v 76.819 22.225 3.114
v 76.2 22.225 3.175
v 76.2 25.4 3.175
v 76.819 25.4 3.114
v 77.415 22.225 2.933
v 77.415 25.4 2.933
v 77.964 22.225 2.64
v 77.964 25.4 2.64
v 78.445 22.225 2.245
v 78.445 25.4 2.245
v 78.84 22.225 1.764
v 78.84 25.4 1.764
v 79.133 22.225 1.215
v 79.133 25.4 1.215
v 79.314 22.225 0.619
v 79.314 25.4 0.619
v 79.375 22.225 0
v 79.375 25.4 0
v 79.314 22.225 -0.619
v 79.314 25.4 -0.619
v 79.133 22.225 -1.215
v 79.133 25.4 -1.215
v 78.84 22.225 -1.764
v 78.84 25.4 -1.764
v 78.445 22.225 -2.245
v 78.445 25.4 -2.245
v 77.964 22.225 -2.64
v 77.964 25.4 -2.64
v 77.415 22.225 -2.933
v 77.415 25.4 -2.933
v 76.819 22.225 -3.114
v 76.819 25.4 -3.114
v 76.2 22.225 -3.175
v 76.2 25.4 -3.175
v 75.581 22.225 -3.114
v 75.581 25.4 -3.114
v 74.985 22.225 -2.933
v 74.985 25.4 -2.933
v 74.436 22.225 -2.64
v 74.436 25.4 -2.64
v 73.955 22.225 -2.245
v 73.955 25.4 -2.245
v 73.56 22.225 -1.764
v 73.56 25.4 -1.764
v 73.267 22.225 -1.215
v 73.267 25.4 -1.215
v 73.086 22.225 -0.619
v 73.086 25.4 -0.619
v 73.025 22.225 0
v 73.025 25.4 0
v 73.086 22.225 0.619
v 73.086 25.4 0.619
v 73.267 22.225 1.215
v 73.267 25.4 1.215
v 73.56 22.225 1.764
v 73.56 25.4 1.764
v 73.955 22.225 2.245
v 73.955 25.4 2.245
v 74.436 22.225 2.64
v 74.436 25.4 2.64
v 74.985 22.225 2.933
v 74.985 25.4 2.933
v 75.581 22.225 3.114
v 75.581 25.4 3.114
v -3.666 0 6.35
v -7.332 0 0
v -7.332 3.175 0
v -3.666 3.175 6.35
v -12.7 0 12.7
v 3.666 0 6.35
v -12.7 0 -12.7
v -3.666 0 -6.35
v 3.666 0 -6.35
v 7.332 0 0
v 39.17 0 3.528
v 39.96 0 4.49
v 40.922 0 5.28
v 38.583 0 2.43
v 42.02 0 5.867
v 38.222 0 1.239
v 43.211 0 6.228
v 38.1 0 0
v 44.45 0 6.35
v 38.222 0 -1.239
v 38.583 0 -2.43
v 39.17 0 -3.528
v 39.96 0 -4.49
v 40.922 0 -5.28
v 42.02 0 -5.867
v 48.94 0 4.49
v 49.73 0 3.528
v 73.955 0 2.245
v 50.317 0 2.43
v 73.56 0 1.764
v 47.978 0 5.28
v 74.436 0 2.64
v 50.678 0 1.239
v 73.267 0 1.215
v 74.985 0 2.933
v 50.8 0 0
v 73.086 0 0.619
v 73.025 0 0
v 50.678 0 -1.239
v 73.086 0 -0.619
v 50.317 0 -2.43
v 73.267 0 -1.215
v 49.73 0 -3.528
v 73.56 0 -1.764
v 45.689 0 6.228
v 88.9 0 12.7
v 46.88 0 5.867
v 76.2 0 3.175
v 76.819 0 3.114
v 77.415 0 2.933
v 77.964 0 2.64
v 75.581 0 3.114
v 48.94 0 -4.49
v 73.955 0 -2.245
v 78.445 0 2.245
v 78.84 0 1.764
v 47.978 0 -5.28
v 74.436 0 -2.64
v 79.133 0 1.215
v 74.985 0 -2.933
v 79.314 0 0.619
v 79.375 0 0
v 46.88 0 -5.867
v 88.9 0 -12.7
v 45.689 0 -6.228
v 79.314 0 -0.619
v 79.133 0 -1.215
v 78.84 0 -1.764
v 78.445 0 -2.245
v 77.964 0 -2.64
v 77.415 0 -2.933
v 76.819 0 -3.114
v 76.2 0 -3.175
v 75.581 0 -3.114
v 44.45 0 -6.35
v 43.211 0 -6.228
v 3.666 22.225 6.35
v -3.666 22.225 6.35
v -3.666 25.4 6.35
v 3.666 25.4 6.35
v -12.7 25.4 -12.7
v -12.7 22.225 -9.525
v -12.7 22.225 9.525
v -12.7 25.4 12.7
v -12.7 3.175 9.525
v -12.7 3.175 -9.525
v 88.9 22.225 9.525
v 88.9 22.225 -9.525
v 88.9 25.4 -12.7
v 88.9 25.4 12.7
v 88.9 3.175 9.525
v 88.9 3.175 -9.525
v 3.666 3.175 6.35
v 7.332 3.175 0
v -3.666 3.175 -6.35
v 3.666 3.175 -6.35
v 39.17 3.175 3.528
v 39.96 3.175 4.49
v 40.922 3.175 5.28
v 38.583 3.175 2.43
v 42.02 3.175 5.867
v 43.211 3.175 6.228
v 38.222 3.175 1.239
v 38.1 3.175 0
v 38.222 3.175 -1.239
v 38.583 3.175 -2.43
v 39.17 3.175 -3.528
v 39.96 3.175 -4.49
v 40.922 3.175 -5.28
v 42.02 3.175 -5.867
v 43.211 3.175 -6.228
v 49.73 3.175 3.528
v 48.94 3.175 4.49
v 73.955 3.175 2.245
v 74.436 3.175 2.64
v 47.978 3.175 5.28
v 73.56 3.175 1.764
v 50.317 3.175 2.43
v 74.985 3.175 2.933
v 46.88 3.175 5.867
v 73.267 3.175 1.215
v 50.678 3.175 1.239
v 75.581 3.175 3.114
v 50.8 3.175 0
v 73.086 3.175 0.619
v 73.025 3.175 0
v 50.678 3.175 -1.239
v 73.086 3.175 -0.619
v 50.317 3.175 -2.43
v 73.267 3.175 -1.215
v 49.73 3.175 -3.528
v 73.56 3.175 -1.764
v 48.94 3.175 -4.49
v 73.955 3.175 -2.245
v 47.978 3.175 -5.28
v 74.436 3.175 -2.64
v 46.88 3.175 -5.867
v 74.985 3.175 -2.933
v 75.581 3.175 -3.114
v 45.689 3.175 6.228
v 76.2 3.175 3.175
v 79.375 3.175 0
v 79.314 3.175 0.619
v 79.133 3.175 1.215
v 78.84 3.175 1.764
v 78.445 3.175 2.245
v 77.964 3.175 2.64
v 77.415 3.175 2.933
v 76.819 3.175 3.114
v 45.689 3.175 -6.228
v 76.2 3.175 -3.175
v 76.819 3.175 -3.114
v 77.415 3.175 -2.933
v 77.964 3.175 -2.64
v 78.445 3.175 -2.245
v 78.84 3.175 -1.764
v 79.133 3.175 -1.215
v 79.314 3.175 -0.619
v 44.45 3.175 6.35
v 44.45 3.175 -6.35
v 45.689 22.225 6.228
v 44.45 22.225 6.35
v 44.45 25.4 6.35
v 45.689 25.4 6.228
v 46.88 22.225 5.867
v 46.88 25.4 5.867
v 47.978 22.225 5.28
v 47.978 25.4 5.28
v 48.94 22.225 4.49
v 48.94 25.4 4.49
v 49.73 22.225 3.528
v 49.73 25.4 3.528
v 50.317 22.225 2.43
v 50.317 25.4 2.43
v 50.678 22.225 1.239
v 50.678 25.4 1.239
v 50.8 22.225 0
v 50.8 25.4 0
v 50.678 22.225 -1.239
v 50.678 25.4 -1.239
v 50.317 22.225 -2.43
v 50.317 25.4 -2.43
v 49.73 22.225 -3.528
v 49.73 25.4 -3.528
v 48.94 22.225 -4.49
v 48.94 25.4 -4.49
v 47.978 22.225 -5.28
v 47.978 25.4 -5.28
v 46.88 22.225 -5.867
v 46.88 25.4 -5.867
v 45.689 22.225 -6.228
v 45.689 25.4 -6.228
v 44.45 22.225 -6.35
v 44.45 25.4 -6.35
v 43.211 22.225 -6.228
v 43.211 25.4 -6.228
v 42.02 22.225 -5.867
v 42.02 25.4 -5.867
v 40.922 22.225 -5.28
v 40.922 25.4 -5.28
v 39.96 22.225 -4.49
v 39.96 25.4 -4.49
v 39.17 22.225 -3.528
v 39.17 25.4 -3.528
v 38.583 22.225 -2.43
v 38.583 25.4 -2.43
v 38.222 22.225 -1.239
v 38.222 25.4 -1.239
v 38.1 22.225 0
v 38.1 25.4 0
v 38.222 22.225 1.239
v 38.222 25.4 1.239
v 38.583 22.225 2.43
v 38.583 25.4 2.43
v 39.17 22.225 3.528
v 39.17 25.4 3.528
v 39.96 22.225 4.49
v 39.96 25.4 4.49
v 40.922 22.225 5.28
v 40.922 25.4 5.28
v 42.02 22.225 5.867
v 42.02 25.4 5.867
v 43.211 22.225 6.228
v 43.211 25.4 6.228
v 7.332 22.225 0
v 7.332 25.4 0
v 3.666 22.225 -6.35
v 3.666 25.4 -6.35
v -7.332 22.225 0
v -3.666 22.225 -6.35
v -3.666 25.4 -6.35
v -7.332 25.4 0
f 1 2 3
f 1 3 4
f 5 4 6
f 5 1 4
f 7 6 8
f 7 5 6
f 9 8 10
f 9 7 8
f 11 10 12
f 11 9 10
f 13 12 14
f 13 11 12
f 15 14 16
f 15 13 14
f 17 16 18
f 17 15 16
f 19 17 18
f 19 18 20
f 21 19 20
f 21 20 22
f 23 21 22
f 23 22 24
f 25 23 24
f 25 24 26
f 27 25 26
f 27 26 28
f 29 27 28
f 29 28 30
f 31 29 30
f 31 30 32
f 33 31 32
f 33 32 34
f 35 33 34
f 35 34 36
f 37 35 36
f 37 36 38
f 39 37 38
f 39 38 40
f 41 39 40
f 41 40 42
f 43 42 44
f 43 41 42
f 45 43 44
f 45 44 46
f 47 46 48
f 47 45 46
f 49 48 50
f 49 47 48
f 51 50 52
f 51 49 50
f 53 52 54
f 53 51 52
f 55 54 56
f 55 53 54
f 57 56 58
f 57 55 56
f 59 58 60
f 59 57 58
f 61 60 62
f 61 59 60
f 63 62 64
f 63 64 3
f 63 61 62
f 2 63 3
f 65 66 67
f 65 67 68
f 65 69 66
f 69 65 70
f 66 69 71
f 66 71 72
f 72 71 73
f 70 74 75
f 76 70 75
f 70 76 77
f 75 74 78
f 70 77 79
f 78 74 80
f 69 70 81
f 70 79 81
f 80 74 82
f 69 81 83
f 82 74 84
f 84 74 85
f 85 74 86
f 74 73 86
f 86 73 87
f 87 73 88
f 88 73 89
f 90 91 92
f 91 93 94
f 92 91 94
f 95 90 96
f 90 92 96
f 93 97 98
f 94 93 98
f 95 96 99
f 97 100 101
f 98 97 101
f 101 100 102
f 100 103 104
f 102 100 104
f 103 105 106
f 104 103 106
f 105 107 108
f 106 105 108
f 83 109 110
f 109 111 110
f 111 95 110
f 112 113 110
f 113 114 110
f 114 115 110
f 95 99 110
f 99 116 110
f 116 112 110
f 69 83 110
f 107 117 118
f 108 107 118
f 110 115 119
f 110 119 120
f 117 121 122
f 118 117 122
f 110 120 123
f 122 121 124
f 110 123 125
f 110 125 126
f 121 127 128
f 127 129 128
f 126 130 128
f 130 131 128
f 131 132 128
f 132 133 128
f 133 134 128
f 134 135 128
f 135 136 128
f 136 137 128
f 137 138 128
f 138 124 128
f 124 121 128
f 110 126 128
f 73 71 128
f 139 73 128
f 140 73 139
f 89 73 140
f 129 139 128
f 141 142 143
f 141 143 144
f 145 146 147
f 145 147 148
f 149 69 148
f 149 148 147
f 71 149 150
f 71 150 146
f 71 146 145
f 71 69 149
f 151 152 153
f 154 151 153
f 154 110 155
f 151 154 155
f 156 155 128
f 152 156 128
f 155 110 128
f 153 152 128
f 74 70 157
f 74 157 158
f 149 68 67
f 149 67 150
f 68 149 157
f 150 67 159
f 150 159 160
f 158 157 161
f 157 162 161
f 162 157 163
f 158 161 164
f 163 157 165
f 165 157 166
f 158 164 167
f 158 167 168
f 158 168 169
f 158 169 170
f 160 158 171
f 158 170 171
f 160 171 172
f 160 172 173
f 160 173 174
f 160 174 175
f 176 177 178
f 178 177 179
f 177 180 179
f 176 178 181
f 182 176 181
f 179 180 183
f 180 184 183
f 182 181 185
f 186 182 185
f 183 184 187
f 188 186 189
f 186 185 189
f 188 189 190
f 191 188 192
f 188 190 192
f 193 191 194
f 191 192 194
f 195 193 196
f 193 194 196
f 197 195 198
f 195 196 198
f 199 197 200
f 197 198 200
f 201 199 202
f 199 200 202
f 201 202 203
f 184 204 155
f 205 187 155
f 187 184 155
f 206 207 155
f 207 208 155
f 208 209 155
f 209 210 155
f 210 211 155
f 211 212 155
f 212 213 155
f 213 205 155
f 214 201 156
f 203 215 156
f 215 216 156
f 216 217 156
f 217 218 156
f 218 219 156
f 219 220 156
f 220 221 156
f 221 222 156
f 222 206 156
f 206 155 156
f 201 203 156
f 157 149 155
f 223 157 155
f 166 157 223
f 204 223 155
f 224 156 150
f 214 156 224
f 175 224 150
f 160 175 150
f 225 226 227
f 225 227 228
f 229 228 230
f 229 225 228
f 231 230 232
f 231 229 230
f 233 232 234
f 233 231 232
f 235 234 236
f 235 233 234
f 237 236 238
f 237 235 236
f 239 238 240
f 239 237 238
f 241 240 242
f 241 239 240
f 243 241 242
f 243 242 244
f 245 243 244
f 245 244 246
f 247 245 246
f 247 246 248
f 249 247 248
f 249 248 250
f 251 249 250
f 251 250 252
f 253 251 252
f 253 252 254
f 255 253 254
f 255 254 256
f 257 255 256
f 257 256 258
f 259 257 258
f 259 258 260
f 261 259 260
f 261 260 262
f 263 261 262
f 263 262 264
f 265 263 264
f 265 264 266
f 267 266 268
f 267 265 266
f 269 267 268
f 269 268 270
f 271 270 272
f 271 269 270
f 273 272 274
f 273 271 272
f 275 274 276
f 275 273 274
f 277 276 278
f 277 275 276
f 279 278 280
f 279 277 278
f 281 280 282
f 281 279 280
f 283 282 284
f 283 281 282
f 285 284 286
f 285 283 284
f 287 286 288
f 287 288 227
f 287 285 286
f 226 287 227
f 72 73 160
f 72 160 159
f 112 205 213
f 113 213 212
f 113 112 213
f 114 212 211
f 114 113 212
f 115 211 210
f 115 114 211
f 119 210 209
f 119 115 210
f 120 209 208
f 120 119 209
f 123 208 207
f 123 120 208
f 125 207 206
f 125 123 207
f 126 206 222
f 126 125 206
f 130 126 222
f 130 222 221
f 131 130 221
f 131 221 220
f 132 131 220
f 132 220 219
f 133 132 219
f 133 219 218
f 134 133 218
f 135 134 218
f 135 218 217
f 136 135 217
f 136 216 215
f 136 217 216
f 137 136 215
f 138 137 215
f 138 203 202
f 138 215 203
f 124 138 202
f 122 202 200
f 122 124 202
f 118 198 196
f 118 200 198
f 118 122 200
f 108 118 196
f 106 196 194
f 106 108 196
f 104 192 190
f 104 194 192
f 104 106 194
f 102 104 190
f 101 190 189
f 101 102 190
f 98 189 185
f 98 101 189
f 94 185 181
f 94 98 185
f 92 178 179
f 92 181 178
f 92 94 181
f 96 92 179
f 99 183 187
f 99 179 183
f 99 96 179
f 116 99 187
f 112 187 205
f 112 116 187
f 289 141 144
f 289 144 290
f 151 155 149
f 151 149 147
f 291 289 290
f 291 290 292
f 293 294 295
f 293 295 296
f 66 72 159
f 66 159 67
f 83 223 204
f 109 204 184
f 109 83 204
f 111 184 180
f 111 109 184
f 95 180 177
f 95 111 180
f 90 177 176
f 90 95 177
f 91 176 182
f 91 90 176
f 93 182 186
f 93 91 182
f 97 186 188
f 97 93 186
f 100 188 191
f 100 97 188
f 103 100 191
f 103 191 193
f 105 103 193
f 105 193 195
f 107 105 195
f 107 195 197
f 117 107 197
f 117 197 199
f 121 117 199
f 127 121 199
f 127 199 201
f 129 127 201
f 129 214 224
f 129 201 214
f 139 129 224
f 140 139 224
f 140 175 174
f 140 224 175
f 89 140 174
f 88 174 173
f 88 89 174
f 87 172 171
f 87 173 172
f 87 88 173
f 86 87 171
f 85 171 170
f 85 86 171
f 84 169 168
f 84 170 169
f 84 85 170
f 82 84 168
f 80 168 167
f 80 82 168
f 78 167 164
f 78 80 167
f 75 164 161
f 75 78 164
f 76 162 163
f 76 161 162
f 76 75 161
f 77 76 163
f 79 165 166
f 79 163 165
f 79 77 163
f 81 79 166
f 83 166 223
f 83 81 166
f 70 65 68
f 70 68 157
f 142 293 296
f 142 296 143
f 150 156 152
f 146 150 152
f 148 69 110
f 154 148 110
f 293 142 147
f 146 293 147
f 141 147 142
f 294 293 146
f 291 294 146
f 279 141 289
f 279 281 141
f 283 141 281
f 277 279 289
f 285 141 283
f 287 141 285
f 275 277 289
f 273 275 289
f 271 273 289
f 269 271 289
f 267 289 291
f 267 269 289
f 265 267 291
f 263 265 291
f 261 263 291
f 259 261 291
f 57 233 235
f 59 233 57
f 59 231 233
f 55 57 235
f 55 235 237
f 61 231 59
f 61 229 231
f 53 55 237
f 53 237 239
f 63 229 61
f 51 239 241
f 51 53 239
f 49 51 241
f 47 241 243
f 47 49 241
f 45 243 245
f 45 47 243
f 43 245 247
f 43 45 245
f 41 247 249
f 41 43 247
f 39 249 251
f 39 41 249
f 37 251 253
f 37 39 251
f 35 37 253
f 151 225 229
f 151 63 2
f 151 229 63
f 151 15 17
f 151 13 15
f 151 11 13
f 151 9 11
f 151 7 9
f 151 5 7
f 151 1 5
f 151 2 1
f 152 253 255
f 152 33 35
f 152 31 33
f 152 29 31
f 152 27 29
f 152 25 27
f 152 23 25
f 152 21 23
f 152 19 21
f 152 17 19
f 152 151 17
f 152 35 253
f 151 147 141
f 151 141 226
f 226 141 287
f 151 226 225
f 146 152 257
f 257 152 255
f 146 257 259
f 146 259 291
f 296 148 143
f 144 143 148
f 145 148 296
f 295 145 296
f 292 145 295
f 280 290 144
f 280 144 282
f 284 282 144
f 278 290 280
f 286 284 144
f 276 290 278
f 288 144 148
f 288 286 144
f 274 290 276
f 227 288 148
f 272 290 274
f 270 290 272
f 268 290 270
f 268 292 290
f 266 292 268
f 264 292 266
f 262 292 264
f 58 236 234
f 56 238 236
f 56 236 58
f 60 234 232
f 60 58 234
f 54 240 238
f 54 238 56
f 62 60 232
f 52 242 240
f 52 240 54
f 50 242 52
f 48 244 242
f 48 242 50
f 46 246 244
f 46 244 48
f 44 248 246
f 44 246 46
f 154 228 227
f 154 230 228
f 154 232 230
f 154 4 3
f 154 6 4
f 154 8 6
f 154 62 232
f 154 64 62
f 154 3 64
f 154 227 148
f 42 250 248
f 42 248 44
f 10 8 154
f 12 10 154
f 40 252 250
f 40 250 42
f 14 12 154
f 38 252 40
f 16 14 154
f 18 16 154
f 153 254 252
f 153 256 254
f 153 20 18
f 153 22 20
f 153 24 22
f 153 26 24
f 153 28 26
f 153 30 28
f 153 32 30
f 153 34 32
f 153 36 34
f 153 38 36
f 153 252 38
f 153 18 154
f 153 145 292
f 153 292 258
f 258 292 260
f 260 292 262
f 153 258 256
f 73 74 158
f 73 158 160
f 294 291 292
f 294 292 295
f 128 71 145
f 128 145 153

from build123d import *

# Parameters (mm, degrees)
SKETCH1_W           = 101.6
SKETCH1_H           = 25.4
SKETCH1_R           = 6.35
SKETCH1_R_2         = 3.175
BOSS_EXTRUDE1_DEPTH = 25.4
SKETCH2_W           = 19.05
SKETCH2_H           = 19.05
CUT_EXTRUDE1_DEPTH  = 106.494123059


with BuildPart() as part:
    # Sketch1 → Boss-Extrude1 (new body)
    with BuildSketch(Plane(origin=(0, 0, 0), x_dir=(1, 0, 0), z_dir=(0, 1, 0))):
        with Locations((38.1, 0)):
            Rectangle(SKETCH1_W, SKETCH1_H)
        with Locations(Location((44.45, 0, 0), (0, 0, 270))):
            Circle(SKETCH1_R, mode=Mode.SUBTRACT)
        with Locations(Location((76.2, 0, 0), (0, 0, 270))):
            Circle(SKETCH1_R_2, mode=Mode.SUBTRACT)
        Polygon((7.332348419, 0), (3.666174209, 6.35), (-3.666174209, 6.35), (-7.332348419, 0), (-3.666174209, -6.35), (3.666174209, -6.35), align=None, mode=Mode.SUBTRACT)
    extrude(amount=BOSS_EXTRUDE1_DEPTH)

    # Sketch2 → Cut-Extrude1 (cut, through all)
    with BuildSketch(Plane(origin=(88.9, 0, 0), x_dir=(0, 0, -1), z_dir=(1, 0, 0))):
        with Locations((0, 12.7)):
            Rectangle(SKETCH2_W, SKETCH2_H)
    extrude(amount=-CUT_EXTRUDE1_DEPTH, mode=Mode.SUBTRACT)


solid = part.part
